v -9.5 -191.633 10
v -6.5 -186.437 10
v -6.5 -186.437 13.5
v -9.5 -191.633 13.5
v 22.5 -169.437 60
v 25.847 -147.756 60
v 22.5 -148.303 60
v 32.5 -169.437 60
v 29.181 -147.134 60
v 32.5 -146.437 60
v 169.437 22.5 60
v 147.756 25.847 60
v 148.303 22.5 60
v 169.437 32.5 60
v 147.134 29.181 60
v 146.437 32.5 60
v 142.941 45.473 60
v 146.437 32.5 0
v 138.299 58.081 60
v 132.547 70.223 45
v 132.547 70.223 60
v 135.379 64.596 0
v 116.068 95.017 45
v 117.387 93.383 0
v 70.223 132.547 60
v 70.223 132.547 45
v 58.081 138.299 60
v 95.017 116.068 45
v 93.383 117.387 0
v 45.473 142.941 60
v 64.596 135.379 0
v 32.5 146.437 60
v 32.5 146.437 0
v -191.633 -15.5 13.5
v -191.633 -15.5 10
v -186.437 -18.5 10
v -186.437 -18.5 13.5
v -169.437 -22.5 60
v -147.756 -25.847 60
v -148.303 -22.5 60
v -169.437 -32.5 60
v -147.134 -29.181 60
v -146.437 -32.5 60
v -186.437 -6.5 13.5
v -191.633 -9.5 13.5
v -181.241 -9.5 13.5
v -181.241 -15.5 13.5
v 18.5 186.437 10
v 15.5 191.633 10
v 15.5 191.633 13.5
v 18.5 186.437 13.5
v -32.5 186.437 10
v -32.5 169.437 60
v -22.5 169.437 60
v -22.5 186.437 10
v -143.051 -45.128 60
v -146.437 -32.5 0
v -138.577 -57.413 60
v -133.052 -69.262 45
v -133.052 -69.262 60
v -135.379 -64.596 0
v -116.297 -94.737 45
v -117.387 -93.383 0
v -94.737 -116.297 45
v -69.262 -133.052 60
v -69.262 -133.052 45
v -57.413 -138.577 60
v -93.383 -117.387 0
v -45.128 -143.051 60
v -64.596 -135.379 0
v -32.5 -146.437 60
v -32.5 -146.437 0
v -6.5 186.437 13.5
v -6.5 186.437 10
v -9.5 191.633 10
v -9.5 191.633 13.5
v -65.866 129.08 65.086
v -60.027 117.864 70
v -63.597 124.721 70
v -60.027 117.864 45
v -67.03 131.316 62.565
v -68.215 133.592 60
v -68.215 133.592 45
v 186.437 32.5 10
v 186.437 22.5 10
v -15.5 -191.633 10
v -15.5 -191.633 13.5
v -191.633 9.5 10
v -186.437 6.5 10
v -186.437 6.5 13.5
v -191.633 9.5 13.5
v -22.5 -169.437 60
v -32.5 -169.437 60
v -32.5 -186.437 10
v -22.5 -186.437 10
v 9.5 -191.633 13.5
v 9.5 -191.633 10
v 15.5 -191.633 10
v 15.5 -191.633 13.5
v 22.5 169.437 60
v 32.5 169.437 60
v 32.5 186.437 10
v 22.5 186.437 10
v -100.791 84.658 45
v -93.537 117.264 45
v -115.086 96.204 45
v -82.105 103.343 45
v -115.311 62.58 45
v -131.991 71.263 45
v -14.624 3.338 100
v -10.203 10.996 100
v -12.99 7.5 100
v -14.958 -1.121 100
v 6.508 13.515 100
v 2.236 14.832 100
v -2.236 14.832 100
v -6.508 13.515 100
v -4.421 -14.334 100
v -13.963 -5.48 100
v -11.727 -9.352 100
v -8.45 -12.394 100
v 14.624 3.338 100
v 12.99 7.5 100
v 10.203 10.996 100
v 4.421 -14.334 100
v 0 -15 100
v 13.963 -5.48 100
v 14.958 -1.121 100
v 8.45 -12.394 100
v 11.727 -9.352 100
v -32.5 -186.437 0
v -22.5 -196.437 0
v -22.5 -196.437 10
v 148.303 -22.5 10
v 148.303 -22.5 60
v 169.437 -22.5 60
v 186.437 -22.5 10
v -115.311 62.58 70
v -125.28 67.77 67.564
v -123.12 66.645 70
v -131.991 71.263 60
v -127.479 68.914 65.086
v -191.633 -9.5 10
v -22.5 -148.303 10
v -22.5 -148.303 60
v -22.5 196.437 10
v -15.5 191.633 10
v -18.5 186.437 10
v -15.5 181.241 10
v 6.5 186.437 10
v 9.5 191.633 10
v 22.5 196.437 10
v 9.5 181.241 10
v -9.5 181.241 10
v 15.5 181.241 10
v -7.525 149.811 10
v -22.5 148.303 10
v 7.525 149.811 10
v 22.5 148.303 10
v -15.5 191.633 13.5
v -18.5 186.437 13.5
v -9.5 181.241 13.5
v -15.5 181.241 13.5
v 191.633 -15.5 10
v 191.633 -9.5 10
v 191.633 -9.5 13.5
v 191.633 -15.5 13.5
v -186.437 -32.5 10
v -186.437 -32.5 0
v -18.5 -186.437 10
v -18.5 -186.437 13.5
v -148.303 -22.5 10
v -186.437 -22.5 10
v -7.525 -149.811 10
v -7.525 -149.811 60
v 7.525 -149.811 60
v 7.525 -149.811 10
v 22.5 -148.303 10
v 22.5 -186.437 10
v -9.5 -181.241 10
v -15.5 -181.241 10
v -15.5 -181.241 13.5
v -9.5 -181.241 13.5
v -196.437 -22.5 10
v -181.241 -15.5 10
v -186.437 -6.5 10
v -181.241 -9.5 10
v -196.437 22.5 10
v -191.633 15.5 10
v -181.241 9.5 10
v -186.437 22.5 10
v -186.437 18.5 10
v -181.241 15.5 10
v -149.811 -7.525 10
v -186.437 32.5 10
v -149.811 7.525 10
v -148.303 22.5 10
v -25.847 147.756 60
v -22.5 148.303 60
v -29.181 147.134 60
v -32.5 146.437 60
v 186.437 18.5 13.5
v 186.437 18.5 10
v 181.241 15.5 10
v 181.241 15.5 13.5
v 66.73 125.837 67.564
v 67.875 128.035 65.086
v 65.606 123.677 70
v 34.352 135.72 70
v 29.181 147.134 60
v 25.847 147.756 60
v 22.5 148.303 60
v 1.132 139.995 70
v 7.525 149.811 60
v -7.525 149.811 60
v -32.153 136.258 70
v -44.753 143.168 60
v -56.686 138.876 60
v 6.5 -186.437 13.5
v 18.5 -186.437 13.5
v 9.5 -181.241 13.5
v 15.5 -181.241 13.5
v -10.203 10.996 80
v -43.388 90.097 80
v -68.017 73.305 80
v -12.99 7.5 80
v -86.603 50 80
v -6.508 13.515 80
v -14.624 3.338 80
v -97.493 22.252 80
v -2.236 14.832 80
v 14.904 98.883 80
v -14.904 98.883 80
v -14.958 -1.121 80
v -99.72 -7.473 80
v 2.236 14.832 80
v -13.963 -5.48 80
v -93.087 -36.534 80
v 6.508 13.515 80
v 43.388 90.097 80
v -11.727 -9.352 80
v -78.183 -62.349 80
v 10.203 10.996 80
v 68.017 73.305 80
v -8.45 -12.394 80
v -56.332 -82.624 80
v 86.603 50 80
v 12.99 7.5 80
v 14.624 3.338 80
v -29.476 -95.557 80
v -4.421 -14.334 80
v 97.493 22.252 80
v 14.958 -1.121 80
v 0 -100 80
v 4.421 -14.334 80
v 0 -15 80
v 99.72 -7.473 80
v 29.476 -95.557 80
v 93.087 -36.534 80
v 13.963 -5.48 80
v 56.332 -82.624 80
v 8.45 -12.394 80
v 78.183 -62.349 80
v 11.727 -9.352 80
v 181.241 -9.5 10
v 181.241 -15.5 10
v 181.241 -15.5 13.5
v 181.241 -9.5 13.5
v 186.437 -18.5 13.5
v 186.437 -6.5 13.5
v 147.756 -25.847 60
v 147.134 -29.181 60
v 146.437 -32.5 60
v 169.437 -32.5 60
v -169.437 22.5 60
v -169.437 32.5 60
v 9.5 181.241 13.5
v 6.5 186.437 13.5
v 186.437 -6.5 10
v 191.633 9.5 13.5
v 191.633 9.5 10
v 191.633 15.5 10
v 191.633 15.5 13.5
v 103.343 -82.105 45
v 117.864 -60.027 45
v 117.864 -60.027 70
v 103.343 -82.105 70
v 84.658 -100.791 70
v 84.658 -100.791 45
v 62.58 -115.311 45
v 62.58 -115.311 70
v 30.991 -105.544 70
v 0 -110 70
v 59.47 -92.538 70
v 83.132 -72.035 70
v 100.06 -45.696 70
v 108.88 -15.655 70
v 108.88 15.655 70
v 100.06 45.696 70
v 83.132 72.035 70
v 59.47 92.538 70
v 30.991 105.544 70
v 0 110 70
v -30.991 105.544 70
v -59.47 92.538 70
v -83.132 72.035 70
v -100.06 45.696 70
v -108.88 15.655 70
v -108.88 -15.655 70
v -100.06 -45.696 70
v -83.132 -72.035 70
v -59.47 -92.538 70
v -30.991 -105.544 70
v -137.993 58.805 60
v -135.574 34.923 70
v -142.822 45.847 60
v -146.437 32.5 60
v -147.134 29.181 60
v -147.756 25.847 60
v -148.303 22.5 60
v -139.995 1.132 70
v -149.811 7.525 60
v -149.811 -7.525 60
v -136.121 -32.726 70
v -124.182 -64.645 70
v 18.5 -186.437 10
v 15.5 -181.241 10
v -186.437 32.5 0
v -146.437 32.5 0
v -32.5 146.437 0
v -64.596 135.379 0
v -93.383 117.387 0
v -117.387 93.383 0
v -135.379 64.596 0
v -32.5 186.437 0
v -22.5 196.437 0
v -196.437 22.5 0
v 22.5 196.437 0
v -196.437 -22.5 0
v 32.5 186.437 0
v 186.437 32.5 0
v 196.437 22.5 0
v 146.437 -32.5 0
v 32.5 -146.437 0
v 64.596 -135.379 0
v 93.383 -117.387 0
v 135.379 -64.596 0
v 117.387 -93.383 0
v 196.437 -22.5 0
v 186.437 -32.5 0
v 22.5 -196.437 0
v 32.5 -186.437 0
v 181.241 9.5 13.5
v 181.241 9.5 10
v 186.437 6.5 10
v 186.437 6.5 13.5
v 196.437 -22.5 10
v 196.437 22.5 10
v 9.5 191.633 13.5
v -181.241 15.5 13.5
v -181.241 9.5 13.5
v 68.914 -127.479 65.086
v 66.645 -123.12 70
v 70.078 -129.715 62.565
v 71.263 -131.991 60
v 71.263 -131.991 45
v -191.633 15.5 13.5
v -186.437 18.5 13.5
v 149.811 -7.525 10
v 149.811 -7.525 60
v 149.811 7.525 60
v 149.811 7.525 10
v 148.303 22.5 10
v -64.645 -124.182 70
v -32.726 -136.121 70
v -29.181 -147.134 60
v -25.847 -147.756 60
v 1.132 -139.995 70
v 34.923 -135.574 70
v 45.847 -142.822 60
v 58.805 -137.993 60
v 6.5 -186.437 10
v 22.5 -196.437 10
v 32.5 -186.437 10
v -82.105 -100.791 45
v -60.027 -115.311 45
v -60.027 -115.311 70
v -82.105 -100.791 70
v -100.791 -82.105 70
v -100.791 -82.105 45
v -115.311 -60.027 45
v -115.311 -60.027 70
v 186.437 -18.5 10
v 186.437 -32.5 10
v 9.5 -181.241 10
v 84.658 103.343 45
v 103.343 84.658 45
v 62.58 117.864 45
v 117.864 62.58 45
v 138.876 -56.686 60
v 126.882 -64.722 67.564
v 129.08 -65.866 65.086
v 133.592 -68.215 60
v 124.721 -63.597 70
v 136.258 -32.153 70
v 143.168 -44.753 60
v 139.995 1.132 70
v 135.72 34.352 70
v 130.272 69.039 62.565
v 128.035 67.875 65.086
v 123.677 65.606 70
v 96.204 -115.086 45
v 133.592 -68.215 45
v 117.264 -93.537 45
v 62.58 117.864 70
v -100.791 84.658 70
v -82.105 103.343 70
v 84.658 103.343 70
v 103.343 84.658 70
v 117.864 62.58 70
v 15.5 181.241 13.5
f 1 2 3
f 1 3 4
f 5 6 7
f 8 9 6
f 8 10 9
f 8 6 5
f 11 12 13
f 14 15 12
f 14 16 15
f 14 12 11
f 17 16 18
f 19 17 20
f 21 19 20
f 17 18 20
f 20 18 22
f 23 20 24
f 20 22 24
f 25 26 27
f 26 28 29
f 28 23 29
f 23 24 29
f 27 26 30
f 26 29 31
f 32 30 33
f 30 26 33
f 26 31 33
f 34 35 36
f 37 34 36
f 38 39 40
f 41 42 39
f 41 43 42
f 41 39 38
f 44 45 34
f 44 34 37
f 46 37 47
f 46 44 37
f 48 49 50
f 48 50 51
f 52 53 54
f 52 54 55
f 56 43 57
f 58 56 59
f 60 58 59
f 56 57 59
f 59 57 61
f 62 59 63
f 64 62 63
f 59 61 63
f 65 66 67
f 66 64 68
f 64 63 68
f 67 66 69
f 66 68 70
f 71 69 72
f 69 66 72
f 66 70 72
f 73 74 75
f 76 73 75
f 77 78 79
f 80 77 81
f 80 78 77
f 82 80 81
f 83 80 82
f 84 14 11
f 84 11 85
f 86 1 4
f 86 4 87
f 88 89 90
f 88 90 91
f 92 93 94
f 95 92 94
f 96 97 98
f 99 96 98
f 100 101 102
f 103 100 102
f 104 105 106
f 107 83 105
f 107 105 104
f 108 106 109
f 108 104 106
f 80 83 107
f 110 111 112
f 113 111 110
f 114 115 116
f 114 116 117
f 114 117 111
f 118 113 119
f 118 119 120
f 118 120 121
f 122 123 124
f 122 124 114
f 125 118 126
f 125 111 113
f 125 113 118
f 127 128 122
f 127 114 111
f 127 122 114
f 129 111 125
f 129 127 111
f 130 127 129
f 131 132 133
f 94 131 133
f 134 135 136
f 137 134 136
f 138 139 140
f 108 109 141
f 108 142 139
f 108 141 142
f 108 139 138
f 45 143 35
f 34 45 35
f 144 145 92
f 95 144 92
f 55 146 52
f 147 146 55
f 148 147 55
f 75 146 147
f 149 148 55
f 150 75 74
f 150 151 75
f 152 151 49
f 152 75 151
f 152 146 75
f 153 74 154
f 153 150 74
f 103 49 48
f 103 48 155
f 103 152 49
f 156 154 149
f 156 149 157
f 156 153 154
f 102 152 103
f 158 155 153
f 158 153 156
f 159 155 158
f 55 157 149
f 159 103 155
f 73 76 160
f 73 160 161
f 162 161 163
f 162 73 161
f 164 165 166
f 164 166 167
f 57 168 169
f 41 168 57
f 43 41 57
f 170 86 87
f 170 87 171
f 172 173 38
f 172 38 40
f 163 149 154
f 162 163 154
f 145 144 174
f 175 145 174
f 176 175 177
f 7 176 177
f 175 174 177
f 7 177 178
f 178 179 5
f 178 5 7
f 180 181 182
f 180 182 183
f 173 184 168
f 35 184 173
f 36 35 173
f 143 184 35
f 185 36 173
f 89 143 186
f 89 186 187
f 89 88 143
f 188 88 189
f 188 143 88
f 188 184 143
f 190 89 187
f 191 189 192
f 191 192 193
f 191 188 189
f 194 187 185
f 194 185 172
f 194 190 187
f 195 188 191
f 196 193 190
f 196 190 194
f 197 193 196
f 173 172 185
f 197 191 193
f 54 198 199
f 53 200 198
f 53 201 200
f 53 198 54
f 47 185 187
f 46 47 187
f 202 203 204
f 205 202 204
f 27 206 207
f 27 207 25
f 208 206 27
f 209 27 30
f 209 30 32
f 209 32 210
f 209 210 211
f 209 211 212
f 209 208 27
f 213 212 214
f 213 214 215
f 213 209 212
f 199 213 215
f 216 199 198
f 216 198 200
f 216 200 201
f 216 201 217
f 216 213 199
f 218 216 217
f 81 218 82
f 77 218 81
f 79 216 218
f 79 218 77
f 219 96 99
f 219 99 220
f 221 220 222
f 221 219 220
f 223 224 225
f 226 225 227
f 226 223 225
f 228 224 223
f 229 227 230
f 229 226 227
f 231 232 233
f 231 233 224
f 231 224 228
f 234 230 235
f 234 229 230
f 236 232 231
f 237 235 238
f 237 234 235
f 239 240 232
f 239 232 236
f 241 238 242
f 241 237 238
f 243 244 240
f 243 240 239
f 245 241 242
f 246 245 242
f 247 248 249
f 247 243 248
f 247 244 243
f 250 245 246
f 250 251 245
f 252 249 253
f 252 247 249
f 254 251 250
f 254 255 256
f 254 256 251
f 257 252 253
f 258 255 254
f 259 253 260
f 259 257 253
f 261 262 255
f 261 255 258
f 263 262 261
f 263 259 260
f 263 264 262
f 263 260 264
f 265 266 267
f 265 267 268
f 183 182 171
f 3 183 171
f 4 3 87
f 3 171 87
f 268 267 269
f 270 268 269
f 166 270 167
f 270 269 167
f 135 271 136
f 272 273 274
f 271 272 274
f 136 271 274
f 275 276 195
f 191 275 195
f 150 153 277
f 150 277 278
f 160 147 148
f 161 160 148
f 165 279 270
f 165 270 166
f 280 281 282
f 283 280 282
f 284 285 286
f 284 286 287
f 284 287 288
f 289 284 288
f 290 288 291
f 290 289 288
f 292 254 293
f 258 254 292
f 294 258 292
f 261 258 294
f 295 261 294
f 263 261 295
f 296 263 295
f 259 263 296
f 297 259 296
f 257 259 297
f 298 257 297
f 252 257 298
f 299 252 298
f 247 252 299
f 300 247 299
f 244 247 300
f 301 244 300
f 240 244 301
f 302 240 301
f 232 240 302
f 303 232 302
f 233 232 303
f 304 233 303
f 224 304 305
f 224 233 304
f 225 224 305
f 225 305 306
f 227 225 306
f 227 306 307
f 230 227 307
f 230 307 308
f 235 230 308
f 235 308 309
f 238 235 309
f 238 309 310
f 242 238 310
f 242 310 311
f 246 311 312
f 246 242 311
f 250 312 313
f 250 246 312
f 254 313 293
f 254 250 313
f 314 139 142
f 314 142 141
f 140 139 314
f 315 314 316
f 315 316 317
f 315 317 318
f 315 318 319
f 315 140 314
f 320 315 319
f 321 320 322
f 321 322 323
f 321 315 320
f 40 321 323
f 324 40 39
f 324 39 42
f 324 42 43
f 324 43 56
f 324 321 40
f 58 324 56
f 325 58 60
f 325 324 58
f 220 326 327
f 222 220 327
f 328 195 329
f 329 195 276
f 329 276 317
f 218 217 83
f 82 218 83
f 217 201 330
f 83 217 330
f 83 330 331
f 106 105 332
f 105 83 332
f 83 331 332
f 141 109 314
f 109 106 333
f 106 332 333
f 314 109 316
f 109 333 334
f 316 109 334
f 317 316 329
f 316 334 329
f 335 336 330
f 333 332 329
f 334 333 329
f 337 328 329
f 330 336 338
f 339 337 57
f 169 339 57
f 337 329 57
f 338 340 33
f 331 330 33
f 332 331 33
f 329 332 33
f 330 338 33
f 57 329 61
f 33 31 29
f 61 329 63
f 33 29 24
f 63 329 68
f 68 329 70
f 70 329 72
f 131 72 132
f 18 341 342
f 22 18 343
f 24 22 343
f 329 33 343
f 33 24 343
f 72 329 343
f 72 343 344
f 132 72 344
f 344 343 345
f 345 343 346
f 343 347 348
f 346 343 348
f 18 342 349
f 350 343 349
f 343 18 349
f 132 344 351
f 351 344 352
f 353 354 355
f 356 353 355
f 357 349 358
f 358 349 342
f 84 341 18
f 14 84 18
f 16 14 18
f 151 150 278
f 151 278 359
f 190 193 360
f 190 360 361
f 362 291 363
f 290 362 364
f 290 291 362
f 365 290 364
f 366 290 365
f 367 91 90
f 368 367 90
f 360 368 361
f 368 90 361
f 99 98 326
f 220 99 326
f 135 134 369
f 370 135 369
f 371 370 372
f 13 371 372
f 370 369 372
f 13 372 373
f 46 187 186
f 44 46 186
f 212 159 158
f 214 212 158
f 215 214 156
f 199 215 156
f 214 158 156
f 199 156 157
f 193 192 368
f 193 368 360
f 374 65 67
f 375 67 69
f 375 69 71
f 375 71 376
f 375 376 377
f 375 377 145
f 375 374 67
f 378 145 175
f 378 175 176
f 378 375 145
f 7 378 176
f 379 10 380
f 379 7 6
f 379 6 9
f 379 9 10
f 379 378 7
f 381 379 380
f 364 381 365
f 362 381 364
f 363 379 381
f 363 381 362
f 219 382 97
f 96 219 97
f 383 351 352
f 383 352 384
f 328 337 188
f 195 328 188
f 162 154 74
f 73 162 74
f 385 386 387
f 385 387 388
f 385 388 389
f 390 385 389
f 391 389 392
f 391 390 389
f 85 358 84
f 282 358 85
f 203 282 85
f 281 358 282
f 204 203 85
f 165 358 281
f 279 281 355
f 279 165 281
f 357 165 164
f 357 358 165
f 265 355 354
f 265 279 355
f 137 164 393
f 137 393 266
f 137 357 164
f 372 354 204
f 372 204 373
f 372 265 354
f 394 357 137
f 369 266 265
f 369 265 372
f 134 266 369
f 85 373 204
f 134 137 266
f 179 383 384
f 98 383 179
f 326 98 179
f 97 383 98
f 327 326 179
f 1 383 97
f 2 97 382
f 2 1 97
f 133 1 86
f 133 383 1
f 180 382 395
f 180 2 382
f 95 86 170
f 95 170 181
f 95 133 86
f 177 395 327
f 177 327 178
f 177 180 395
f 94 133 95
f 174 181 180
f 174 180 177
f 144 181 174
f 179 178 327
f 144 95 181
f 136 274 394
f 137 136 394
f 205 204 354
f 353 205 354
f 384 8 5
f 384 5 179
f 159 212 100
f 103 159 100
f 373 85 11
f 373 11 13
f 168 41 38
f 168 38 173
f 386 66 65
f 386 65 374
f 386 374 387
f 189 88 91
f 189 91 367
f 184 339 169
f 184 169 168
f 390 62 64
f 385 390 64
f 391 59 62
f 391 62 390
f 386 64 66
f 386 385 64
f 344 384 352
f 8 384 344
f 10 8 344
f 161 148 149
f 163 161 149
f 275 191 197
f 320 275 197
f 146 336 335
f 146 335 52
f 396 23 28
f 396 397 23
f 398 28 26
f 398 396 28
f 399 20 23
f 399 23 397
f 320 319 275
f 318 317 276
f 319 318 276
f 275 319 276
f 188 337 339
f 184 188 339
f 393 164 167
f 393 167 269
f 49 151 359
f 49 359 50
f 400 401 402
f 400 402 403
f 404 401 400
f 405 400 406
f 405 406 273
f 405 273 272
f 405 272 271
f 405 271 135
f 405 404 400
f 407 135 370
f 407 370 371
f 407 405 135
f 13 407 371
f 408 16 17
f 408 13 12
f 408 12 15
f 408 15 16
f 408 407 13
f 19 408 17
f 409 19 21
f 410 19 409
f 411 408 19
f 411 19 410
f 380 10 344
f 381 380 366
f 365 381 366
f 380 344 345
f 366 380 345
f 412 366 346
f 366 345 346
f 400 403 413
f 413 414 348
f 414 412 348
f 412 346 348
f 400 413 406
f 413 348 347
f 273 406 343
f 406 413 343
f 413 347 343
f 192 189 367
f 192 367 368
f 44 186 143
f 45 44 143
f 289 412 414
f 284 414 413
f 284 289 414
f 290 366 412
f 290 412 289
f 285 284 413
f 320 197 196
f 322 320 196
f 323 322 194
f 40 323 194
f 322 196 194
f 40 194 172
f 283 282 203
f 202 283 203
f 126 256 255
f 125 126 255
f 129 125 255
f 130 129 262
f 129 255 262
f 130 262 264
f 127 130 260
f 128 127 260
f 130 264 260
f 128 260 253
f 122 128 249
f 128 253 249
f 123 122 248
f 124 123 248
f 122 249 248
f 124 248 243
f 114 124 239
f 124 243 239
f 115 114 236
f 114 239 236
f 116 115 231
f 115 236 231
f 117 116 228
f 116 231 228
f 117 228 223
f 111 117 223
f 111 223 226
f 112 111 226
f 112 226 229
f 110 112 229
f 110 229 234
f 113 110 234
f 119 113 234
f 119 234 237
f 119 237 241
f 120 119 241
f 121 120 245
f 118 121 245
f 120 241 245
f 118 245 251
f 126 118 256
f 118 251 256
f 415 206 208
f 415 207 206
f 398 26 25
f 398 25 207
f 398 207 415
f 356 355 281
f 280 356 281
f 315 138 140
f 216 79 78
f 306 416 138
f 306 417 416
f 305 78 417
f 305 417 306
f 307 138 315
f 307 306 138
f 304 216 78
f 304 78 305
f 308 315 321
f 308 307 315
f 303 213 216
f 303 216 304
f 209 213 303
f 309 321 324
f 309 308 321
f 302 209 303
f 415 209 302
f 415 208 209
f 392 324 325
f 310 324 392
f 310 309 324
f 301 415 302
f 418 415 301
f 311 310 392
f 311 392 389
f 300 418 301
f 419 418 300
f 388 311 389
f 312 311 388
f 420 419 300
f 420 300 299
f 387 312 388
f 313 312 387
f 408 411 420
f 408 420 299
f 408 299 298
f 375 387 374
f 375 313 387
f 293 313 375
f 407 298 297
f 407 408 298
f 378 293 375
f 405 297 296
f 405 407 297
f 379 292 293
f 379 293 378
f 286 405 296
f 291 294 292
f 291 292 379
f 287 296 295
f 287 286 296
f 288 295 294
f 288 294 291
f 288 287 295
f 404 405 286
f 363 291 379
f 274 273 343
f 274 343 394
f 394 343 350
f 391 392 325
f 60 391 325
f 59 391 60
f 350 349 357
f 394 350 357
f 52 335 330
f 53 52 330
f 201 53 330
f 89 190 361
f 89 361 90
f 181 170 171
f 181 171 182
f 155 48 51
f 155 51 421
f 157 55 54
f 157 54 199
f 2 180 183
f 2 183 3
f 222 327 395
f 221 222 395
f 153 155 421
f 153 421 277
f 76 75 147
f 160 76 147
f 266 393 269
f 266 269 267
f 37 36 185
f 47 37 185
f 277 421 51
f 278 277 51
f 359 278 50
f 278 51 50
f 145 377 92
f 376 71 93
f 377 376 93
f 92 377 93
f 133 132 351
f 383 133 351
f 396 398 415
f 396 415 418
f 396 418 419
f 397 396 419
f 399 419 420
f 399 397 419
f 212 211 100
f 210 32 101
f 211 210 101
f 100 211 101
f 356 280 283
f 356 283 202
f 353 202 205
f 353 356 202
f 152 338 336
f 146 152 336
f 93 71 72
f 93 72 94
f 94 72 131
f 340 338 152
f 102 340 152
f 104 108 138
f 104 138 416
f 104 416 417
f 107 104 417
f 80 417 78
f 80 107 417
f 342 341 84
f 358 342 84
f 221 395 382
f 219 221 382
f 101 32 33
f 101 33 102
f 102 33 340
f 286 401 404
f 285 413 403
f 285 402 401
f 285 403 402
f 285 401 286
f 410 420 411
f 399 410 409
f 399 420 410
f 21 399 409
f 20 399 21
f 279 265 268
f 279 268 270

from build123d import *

# Parameters (mm, degrees)
SKETCH1_R                    = 150
BOSS_EXTRUDE1_DEPTH          = 70
CHAMFER1_SIZE                = 10
BOSS_EXTRUDE2_START          = -70
BOSS_EXTRUDE2_DEPTH          = 10
CHAMFER2_SIZE                = 10
BOSS_EXTRUDE3_DEPTH          = 10
BOSS_EXTRUDE4_DEPTH          = 3.5
CIRPATTERN1_COUNT            = 4
CIRPATTERN1_COPY_1_DEPTH     = 10
CIRPATTERN1_COPY_2_DEPTH     = 10
CIRPATTERN1_COPY_3_DEPTH     = 10
CIRPATTERN1_COPY_4_DEPTH     = 3.5
CIRPATTERN1_COPY_5_DEPTH     = 3.5
CIRPATTERN1_COPY_6_DEPTH     = 3.5
CHAMFER2_OF_CIRPATTERN1_SIZE = 10
CUT_EXTRUDE1_START           = -25
CUT_EXTRUDE1_DEPTH           = 25
CIRPATTERN2_COUNT            = 4
SKETCH6_R                    = 110
BOSS_EXTRUDE5_DEPTH          = 10
CHAMFER3_SIZE                = 10
SKETCH8_R                    = 15
BOSS_EXTRUDE6_DEPTH          = 20
BODY_MOVE_COPY2_ANGLE        = 90


with BuildPart() as part:
    # Sketch1 → Boss-Extrude1 (new body)
    with BuildSketch(Plane(origin=(0, 0, 0), x_dir=(1, 0, 0), z_dir=(0, 1, 0))):
        with Locations(Location((0, 0, 0), (0, 0, 270))):
            Circle(SKETCH1_R)
    extrude(amount=BOSS_EXTRUDE1_DEPTH)

    # Chamfer1
    chamfer1_edges = [part.edges().sort_by_distance(p)[0] for p in [
        (0, 70, -150),
    ]]
    chamfer(chamfer1_edges, length=CHAMFER1_SIZE)

    # Sketch2 → Boss-Extrude2 (add)
    with BuildSketch(Plane(origin=(0, 70, 0), x_dir=(1, 0, 0), z_dir=(0, 1, 0)).offset(BOSS_EXTRUDE2_START)):
        with BuildLine():
            Line((-146.436846456, 32.5), (-196.436846456, 32.5))
            Line((-196.436846456, 32.5), (-196.436846456, -32.5))
            Line((-196.436846456, -32.5), (-146.436846456, -32.5))
            ThreePointArc((-146.436846456, -32.5), (-150, 0), (-146.436846456, 32.5))
        make_face()
    boss_extrude2 = extrude(amount=BOSS_EXTRUDE2_DEPTH)

    # Chamfer2
    chamfer2_edges = [part.edges().sort_by_distance(p)[0] for p in [
        (-196.436846456, 5, -32.5),
        (-196.436846456, 5, 32.5),
    ]]
    chamfer(chamfer2_edges, length=CHAMFER2_SIZE)

    # Sketch3 → Boss-Extrude3 (add)
    with BuildSketch(Plane.XY.offset(32.5)):
        Polygon((-146.436846456, 10), (-146.436846456, 60), (-169.436846456, 60), (-186.436846456, 10), align=None)
    boss_extrude3 = extrude(amount=-BOSS_EXTRUDE3_DEPTH)

    # Sketch4 → Boss-Extrude4 (add)
    with BuildSketch(Plane(origin=(0, 10, 0), x_dir=(1, 0, 0), z_dir=(0, 1, 0))):
        Polygon((-186.436846456, -6.5), (-191.632998879, -9.5), (-191.632998879, -15.5), (-186.436846456, -18.5), (-181.240694033, -15.5), (-181.240694033, -9.5), align=None)
    boss_extrude4 = extrude(amount=BOSS_EXTRUDE4_DEPTH)

    # Mirror1: Boss-Extrude3, Boss-Extrude4 across plane
    add(boss_extrude3.mirror(Plane.XY))
    add(boss_extrude4.mirror(Plane.XY))

    # CirPattern1: Boss-Extrude2, Boss-Extrude3, Boss-Extrude4 ×4 about axis
    cirpattern1_axis = Axis((0, 0, 0), (0, 1, 0))
    add([boss_extrude2.rotate(cirpattern1_axis, i * 360 / CIRPATTERN1_COUNT) for i in range(1, CIRPATTERN1_COUNT)])
    add([boss_extrude3.rotate(cirpattern1_axis, i * 360 / CIRPATTERN1_COUNT) for i in range(1, CIRPATTERN1_COUNT)])
    add([boss_extrude4.rotate(cirpattern1_axis, i * 360 / CIRPATTERN1_COUNT) for i in range(1, CIRPATTERN1_COUNT)])

    # CirPattern1 copy 1 sketch → CirPattern1 copy 1 (add)
    with BuildSketch(Plane(origin=(-32.5, 0, 0), x_dir=(0, 0, -1), z_dir=(-1, 0, 0))):
        Polygon((-146.436846456, -10), (-146.436846456, -60), (-169.436846456, -60), (-186.436846456, -10), align=None)
    extrude(amount=-CIRPATTERN1_COPY_1_DEPTH)

    # CirPattern1 copy 2 sketch → CirPattern1 copy 2 (add)
    with BuildSketch(Plane(origin=(0, 0, 32.5), x_dir=(-1, 0, 0), z_dir=(0, 0, 1))):
        Polygon((-146.436846456, -10), (-146.436846456, -60), (-169.436846456, -60), (-186.436846456, -10), align=None)
    extrude(amount=-CIRPATTERN1_COPY_2_DEPTH)

    # CirPattern1 copy 3 sketch → CirPattern1 copy 3 (add)
    with BuildSketch(Plane(origin=(32.5, 0, 0), x_dir=(0, 0, 1), z_dir=(1, 0, 0))):
        Polygon((-146.436846456, -10), (-146.436846456, -60), (-169.436846456, -60), (-186.436846456, -10), align=None)
    extrude(amount=-CIRPATTERN1_COPY_3_DEPTH)

    # CirPattern1 copy 4 sketch → CirPattern1 copy 4 (add)
    with BuildSketch(Plane(origin=(0, 10, 0), x_dir=(0, 0, -1), z_dir=(0, 1, 0))):
        Polygon((-186.436846456, 6.5), (-191.632998879, 9.5), (-191.632998879, 15.5), (-186.436846456, 18.5), (-181.240694033, 15.5), (-181.240694033, 9.5), align=None)
    extrude(amount=CIRPATTERN1_COPY_4_DEPTH)

    # CirPattern1 copy 5 sketch → CirPattern1 copy 5 (add)
    with BuildSketch(Plane(origin=(0, 10, 0), x_dir=(-1, 0, 0), z_dir=(0, 1, 0))):
        Polygon((-186.436846456, 6.5), (-191.632998879, 9.5), (-191.632998879, 15.5), (-186.436846456, 18.5), (-181.240694033, 15.5), (-181.240694033, 9.5), align=None)
    extrude(amount=CIRPATTERN1_COPY_5_DEPTH)

    # CirPattern1 copy 6 sketch → CirPattern1 copy 6 (add)
    with BuildSketch(Plane.ZX.offset(10)):
        Polygon((-186.436846456, 6.5), (-191.632998879, 9.5), (-191.632998879, 15.5), (-186.436846456, 18.5), (-181.240694033, 15.5), (-181.240694033, 9.5), align=None)
    extrude(amount=CIRPATTERN1_COPY_6_DEPTH)

    # Chamfer2 of CirPattern1
    chamfer2_of_cirpattern1_edges = [part.edges().sort_by_distance(p)[0] for p in [
        (-32.5, 5, 196.436846456),
        (32.5, 5, 196.436846456),
        (196.436846456, 5, 32.5),
        (196.436846456, 5, -32.5),
        (32.5, 5, -196.436846456),
        (-32.5, 5, -196.436846456),
    ]]
    chamfer(chamfer2_of_cirpattern1_edges, length=CHAMFER2_OF_CIRPATTERN1_SIZE)

    # Sketch5 → Cut-Extrude1 (cut)
    with BuildSketch(Plane(origin=(0, 70, 0), x_dir=(1, 0, 0), z_dir=(0, 1, 0)).offset(CUT_EXTRUDE1_START)):
        with BuildLine():
            Line((-115.311408313, -60.027319721), (-133.051624977, -69.262291985))
            ThreePointArc((-133.051624977, -69.262291985), (-106.066017178, -106.066017178), (-69.262291985, -133.051624977))
            Line((-69.262291985, -133.051624977), (-60.027319721, -115.311408313))
            ThreePointArc((-60.027319721, -115.311408313), (-91.923881554, -91.923881554), (-115.311408313, -60.027319721))
        make_face()
    cut_extrude1 = extrude(amount=CUT_EXTRUDE1_DEPTH, mode=Mode.SUBTRACT)

    # CirPattern2: Cut-Extrude1 ×4 about axis
    cirpattern2_axis = Axis((1.276358498, 0, -1.276358498), (0, 1, 0))
    for i in range(1, CIRPATTERN2_COUNT):
        add(cut_extrude1.rotate(cirpattern2_axis, i * 360 / CIRPATTERN2_COUNT), mode=Mode.SUBTRACT)

    # Sketch6 → Boss-Extrude5 (add)
    with BuildSketch(Plane(origin=(0, 70, 0), x_dir=(1, 0, 0), z_dir=(0, 1, 0))):
        with Locations(Location((0, 0, 0), (0, 0, 270))):
            Circle(SKETCH6_R)
    extrude(amount=BOSS_EXTRUDE5_DEPTH)

    # Chamfer3
    chamfer3_edges = [part.edges().sort_by_distance(p)[0] for p in [
        (0, 80, -110),
    ]]
    chamfer(chamfer3_edges, length=CHAMFER3_SIZE - 0.0001)  # a hair under: the kernel refuses the full size

    # Sketch8 → Boss-Extrude6 (add)
    with BuildSketch(Plane(origin=(0, 80, 0), x_dir=(1, 0, 0), z_dir=(0, 1, 0))):
        with Locations(Location((0, 0, 0), (0, 0, 270))):
            Circle(SKETCH8_R)
    extrude(amount=BOSS_EXTRUDE6_DEPTH)


with BuildPart() as part_1:
    # Body-Move/Copy1: moved
    add(part.part.moved(Location((0, -99.99999995, 0))))


with BuildPart() as part_2:
    # Body-Move/Copy2: read off the stored shape, not the designer's step
    # Body-Move/Copy2: moved
    add(part_1.part.moved(Location((0, 50, 50))).rotate(Axis((0, 0, 0), (1, 0, 0)), BODY_MOVE_COPY2_ANGLE))


with BuildPart() as part_3:
    # Body-Move/Copy3: moved
    add(part_2.part.moved(Location((0, 50, -50))))


with BuildPart() as part_4:
    # Body-Move/Copy4: moved
    add(part_3.part.moved(Location((0, 0, 20))))


with BuildPart() as part_5:
    # Body-Move/Copy6: moved
    add(part_4.part.moved(Location((0, 0, 80))))


solid = part_5.part
